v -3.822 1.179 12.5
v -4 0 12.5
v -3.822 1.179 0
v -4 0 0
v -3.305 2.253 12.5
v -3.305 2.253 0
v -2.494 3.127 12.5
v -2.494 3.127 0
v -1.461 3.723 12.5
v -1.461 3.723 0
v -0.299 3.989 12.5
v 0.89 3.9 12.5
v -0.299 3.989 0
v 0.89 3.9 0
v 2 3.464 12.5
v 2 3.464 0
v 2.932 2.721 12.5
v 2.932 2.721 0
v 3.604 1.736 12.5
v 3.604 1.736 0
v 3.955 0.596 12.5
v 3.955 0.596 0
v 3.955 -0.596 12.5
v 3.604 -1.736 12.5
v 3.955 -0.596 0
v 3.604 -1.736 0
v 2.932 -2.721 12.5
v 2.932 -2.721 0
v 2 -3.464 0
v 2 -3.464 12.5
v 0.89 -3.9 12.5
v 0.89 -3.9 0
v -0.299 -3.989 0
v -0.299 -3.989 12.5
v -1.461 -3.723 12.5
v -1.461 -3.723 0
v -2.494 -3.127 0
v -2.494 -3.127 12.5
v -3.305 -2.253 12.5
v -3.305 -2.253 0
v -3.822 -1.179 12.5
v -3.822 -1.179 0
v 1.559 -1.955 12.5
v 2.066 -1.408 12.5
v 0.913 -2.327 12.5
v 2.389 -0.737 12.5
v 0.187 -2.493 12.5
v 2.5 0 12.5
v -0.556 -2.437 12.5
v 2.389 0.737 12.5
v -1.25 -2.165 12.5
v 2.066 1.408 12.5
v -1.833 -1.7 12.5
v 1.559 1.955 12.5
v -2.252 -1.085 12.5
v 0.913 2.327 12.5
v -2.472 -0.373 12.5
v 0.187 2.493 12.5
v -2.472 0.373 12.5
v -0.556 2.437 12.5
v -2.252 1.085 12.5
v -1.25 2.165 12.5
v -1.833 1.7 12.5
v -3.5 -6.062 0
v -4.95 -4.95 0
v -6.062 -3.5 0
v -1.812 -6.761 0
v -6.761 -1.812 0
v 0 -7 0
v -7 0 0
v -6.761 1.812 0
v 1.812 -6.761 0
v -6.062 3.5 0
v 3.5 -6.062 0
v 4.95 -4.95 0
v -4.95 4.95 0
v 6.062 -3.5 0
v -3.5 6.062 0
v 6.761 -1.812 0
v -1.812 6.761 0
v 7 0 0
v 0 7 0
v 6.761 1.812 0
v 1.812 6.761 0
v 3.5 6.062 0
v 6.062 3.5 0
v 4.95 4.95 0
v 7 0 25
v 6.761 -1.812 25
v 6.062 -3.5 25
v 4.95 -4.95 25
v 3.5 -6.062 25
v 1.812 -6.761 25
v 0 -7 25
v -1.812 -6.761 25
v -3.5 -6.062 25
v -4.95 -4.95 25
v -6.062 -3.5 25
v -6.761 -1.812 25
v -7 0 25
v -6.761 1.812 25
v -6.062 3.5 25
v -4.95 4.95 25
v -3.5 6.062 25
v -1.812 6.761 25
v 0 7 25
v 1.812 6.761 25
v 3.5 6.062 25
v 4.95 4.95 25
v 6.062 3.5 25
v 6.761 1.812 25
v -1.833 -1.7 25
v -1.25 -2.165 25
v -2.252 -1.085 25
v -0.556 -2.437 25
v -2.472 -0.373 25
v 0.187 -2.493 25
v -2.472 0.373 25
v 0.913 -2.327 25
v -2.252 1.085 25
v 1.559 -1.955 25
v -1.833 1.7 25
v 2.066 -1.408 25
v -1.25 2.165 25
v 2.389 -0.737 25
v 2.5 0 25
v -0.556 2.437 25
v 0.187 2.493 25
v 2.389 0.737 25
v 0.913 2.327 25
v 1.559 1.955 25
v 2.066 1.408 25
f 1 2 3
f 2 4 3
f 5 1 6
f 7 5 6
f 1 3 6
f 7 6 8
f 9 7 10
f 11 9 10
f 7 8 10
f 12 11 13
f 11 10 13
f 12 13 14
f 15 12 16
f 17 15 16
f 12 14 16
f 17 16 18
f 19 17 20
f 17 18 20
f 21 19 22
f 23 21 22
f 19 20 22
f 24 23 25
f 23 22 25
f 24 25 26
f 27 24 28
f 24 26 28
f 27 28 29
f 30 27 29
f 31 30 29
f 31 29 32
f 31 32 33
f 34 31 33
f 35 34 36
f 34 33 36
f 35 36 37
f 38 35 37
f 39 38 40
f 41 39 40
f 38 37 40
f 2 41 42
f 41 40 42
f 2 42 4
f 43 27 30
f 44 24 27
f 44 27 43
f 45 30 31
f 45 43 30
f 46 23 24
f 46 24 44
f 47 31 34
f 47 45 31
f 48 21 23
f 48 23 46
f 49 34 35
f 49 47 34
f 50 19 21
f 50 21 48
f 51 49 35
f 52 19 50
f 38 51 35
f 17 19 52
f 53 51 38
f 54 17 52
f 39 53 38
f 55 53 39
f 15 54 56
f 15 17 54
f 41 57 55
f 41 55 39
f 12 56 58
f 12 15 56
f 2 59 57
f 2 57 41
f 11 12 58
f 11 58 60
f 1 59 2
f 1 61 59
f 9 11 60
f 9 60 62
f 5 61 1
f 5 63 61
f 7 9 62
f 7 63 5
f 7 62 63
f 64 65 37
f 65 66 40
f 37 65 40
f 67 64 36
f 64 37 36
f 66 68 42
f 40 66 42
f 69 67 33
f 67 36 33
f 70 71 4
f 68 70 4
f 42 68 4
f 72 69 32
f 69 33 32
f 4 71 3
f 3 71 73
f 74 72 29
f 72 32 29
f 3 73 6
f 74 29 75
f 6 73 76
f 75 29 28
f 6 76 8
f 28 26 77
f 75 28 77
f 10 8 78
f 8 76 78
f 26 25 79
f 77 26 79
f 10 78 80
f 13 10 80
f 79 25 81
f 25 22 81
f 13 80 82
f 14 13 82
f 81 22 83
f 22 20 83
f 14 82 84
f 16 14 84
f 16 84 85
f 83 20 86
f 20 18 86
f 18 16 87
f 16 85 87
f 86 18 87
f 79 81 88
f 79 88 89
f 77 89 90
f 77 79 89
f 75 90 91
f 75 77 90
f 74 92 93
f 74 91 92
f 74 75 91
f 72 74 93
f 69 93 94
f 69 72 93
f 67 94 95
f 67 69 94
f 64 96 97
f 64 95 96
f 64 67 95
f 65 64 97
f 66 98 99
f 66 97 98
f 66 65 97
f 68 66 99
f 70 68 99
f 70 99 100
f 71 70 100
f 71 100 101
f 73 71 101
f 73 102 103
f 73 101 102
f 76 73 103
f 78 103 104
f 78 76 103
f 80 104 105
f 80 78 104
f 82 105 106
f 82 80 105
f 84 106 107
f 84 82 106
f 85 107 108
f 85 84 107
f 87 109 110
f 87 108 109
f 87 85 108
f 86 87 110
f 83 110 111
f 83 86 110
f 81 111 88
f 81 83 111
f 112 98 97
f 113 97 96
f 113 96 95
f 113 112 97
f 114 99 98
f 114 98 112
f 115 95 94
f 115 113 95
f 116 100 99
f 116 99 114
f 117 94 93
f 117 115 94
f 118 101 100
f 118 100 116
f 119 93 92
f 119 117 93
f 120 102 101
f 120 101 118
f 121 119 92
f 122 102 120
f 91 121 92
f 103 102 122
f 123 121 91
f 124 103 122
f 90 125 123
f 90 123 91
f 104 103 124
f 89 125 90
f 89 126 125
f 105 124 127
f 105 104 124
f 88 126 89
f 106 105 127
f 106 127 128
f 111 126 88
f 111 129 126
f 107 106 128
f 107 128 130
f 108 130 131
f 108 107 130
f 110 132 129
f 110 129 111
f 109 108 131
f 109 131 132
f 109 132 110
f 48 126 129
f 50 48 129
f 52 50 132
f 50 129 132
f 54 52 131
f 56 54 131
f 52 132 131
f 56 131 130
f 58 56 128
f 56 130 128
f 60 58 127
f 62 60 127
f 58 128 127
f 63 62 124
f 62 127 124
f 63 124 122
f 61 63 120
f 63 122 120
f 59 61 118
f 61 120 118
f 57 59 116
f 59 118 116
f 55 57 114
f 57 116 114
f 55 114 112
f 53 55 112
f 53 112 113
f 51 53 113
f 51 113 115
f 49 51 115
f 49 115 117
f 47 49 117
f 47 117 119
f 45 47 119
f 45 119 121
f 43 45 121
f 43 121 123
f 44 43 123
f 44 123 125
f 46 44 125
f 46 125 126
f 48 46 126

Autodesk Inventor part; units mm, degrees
ref_plane "YZ Plane" through (0, 0, 0) normal (1, 0, 0) x (0, 1, 0)
ref_plane "XZ Plane" through (0, 0, 0) normal (0, 1, 0) x (-1, 0, 0)
ref_plane "XY Plane" through (0, 0, 0) normal (0, 0, 1) x (1, 0, 0)
sketch "Sketch1" plane through (0, 0, 0) normal (0, 0, 1) x (1, 0, 0)
  circle A0 centre (0, 0) radius 7
  dimension "d0" = 14
extrude "Extrusion1" add sketch "Sketch1" along normal blind 25
sketch "Sketch2" plane through (0, 0, 25) normal (0, 0, 1) x (1, 0, 0)
  circle A0 centre (0, 0) radius 2.5
  dimension "d3" = 5
extrude "Extrusion2" cut sketch "Sketch2" against normal up to surface (25 mm away)
sketch "Sketch3" plane through (0, 0, 0) normal (0, 0, -1) x (-1, 0, 0)
  circle A0 centre (0, 0) radius 4
  dimension "d6" = 8
extrude "Extrusion3" cut sketch "Sketch3" against normal blind 12.5
properties part number "Couple"
